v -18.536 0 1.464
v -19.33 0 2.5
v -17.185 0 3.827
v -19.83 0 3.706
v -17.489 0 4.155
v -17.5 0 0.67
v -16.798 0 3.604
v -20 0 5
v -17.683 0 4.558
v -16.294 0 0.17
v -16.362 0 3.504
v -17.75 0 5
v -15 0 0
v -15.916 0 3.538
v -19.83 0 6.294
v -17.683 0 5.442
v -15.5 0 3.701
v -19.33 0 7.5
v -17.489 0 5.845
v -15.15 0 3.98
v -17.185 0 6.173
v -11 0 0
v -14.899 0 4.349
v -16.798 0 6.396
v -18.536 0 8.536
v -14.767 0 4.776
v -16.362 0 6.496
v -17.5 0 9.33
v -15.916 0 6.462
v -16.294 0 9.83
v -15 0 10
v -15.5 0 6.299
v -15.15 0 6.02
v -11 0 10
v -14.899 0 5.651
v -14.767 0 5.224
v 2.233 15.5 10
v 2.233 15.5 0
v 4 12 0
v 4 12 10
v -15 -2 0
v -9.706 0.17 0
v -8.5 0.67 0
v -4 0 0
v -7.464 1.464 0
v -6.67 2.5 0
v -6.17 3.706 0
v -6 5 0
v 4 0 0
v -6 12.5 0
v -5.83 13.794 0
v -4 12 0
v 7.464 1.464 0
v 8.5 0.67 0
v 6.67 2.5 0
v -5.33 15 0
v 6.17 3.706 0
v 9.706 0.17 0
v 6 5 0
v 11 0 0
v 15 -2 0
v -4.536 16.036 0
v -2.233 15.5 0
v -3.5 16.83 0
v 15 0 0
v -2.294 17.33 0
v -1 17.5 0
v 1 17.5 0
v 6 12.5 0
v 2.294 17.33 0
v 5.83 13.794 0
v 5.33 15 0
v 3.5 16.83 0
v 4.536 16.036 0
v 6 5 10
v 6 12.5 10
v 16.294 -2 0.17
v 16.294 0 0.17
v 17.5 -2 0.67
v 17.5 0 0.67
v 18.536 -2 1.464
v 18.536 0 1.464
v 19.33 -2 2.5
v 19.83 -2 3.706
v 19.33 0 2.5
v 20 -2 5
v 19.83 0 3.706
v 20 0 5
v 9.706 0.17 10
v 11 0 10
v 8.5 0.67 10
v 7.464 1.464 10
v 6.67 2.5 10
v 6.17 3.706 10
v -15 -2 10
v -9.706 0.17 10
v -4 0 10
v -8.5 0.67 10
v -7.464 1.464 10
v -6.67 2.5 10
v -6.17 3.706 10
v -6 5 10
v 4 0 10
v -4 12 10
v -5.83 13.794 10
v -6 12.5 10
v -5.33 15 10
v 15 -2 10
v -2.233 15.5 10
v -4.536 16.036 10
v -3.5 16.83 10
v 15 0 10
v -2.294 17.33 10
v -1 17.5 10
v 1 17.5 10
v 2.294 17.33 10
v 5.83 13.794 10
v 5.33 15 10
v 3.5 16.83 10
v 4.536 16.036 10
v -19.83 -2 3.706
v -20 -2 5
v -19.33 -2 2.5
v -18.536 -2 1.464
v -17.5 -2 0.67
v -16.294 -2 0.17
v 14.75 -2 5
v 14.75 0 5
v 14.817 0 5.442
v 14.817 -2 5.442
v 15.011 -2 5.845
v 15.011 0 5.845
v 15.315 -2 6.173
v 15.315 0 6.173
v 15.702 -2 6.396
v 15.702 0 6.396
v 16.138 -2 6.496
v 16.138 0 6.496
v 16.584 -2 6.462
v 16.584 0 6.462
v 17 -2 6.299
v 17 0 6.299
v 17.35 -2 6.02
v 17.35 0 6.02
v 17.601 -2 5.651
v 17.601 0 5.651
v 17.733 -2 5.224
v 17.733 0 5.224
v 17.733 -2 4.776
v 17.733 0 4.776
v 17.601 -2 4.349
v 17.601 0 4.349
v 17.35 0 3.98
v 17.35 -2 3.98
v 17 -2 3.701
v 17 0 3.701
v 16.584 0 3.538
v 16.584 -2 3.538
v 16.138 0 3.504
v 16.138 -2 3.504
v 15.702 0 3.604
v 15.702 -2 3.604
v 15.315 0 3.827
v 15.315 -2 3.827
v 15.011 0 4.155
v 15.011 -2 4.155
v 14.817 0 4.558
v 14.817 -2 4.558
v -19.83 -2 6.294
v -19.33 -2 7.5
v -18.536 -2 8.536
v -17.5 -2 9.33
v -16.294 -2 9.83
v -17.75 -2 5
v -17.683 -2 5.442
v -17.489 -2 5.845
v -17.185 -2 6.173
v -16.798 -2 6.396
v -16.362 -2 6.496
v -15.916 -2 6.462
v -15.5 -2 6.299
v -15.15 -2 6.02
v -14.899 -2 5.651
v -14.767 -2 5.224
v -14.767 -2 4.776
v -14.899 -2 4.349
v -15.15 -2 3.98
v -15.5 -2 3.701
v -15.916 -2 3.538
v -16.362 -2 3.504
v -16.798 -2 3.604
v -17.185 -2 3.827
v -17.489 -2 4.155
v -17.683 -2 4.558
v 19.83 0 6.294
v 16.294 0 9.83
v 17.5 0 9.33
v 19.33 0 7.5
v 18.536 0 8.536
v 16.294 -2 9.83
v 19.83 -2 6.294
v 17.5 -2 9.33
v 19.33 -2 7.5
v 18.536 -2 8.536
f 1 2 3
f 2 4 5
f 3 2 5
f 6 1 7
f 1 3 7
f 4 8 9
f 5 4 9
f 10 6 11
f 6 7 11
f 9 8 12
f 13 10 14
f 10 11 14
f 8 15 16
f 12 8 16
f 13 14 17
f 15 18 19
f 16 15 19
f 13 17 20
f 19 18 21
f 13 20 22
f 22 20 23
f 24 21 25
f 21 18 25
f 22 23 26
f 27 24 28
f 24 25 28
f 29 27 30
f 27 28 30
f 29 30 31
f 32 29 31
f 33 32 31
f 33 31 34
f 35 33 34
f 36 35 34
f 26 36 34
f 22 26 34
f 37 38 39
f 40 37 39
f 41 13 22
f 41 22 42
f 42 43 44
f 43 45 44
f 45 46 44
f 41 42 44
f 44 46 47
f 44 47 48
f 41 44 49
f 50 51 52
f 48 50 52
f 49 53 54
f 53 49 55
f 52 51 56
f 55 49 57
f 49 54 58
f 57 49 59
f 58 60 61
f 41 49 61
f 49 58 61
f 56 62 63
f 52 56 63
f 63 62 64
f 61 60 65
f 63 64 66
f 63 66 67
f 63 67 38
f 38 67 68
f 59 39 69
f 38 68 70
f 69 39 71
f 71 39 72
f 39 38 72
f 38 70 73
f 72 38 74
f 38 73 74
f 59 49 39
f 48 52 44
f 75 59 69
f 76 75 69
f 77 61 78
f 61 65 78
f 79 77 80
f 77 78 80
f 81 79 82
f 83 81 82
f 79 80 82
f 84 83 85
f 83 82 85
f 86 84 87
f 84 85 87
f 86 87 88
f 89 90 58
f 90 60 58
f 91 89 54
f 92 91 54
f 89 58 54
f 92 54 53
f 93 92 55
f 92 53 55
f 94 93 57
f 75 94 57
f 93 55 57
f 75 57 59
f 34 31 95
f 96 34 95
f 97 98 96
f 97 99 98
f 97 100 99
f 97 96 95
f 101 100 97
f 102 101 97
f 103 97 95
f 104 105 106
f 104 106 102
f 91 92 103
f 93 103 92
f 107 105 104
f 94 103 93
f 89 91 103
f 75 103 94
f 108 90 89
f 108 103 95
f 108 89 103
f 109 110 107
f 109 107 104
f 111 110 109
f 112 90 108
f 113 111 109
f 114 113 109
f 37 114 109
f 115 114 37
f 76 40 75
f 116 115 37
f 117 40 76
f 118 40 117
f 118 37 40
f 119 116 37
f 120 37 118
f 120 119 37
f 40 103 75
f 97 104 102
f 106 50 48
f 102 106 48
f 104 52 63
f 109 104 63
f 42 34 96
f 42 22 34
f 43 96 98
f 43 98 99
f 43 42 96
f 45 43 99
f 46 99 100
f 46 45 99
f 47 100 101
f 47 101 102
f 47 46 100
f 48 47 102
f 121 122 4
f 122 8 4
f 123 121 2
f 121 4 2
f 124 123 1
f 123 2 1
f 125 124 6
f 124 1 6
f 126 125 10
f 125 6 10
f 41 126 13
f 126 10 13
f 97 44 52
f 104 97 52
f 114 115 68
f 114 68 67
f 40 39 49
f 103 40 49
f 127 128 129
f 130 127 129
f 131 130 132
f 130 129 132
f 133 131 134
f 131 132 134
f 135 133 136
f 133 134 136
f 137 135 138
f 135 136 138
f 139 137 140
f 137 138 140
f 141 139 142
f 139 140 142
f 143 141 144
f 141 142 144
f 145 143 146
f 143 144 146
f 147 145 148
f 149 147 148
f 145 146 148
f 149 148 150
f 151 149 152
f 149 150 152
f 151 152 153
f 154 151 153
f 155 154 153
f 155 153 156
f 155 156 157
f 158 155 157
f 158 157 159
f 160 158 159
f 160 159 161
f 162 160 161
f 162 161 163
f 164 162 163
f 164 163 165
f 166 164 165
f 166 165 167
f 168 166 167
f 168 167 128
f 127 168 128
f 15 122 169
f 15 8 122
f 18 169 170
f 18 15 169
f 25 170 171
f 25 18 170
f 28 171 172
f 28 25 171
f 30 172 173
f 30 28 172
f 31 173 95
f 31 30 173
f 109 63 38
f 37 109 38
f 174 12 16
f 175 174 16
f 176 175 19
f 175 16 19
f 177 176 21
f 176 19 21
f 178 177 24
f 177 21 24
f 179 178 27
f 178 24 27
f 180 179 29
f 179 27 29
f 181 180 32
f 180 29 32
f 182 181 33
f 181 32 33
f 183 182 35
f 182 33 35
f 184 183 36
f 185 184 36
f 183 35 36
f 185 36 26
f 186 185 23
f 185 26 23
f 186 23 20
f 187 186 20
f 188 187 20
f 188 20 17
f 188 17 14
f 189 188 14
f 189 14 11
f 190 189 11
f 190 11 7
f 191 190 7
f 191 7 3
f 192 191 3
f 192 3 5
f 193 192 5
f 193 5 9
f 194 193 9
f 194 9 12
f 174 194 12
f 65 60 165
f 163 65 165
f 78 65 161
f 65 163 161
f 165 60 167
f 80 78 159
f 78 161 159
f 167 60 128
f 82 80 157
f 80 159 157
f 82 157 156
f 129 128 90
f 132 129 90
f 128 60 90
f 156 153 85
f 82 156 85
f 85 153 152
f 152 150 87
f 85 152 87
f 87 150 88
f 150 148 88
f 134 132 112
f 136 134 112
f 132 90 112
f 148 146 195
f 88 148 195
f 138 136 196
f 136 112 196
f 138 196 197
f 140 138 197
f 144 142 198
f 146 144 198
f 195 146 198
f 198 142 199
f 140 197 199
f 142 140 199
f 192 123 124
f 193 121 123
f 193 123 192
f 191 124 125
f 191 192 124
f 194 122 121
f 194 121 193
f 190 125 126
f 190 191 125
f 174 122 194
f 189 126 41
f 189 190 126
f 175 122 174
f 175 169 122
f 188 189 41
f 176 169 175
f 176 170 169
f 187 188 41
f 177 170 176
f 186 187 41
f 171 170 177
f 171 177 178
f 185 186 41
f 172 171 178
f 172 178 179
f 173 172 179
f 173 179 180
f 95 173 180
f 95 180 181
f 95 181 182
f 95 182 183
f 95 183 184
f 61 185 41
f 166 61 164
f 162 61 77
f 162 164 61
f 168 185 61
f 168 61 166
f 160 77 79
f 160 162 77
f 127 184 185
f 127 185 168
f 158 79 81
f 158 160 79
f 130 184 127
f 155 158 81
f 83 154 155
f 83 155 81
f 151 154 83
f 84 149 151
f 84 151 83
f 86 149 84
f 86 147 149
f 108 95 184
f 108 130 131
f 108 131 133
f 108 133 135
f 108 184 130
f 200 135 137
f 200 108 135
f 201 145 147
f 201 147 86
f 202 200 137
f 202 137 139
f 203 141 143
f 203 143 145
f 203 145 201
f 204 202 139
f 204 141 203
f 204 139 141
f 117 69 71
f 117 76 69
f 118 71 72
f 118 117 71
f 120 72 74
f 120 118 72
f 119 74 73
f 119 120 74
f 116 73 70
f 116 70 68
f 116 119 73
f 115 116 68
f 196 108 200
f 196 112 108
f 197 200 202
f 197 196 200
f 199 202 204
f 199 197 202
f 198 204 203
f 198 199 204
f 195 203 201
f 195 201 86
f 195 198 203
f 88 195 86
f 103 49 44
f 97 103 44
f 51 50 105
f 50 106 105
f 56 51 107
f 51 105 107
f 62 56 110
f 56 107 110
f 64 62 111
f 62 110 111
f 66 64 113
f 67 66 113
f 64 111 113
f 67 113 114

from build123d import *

# Parameters (mm, degrees)
F1_DEPTH = 10
F2_W     = 14
F2_H     = 2
F3_DEPTH = 10
F4_R     = 1.5
F5_DEPTH = 25
F6_R     = 4.99999


# Not quite as in the source:
# - a fillet or chamfer is up to 0.001 mm smaller than in the source, because OpenCascade refuses the exact size


with BuildPart() as f1:
    # F0 (on Top) → F1 (new body)
    with BuildSketch(Plane.XY):
        Polygon((4, 0), (0, 0), (-4, 0), (-6, 0), (-6, -2), (6, -2), (6, 0), align=None)
        Polygon((-6, 0), (-4, 0), (-4, 12), (-2.2325584196, 15.5), (2.2325584196, 15.5), (4, 12), (4, 0), (6, 0), (6, 17.5), (-6, 17.5), align=None)
    extrude(amount=F1_DEPTH)

    # F2 (on face) → F3 (join)
    with BuildSketch(Plane.XY.offset(10)):
        with Locations((-13, -1)):
            Rectangle(F2_W, F2_H)
        with Locations((13, -1)):
            Rectangle(F2_W, F2_H)
    extrude(amount=-F3_DEPTH)

    # F4 (on face) → F5 (cut)
    with BuildSketch(Plane(origin=(0, 0, 0), x_dir=(-1, 0, 0), z_dir=(0, 1, 0))):
        with Locations((16.25, 5)):
            Circle(F4_R)
        with Locations((-16.25, 5)):
            Circle(F4_R)
    extrude(amount=-F5_DEPTH, mode=Mode.SUBTRACT)

    # F6 (radius 5 in the source; OpenCascade refuses exactly that, so slightly less here)
    f6_edges = [f1.edges().sort_by_distance(p)[0] for p in [
        (-6, 17.5, 5),
        (6, 17.5, 5),
        (-6, 0, 5),
        (6, 0, 5),
        (-20, -1, 10),
        (-20, -1, 0),
        (20, -1, 10),
        (20, -1, 0),
    ]]
    fillet(f6_edges, radius=F6_R)


solid = f1.part
